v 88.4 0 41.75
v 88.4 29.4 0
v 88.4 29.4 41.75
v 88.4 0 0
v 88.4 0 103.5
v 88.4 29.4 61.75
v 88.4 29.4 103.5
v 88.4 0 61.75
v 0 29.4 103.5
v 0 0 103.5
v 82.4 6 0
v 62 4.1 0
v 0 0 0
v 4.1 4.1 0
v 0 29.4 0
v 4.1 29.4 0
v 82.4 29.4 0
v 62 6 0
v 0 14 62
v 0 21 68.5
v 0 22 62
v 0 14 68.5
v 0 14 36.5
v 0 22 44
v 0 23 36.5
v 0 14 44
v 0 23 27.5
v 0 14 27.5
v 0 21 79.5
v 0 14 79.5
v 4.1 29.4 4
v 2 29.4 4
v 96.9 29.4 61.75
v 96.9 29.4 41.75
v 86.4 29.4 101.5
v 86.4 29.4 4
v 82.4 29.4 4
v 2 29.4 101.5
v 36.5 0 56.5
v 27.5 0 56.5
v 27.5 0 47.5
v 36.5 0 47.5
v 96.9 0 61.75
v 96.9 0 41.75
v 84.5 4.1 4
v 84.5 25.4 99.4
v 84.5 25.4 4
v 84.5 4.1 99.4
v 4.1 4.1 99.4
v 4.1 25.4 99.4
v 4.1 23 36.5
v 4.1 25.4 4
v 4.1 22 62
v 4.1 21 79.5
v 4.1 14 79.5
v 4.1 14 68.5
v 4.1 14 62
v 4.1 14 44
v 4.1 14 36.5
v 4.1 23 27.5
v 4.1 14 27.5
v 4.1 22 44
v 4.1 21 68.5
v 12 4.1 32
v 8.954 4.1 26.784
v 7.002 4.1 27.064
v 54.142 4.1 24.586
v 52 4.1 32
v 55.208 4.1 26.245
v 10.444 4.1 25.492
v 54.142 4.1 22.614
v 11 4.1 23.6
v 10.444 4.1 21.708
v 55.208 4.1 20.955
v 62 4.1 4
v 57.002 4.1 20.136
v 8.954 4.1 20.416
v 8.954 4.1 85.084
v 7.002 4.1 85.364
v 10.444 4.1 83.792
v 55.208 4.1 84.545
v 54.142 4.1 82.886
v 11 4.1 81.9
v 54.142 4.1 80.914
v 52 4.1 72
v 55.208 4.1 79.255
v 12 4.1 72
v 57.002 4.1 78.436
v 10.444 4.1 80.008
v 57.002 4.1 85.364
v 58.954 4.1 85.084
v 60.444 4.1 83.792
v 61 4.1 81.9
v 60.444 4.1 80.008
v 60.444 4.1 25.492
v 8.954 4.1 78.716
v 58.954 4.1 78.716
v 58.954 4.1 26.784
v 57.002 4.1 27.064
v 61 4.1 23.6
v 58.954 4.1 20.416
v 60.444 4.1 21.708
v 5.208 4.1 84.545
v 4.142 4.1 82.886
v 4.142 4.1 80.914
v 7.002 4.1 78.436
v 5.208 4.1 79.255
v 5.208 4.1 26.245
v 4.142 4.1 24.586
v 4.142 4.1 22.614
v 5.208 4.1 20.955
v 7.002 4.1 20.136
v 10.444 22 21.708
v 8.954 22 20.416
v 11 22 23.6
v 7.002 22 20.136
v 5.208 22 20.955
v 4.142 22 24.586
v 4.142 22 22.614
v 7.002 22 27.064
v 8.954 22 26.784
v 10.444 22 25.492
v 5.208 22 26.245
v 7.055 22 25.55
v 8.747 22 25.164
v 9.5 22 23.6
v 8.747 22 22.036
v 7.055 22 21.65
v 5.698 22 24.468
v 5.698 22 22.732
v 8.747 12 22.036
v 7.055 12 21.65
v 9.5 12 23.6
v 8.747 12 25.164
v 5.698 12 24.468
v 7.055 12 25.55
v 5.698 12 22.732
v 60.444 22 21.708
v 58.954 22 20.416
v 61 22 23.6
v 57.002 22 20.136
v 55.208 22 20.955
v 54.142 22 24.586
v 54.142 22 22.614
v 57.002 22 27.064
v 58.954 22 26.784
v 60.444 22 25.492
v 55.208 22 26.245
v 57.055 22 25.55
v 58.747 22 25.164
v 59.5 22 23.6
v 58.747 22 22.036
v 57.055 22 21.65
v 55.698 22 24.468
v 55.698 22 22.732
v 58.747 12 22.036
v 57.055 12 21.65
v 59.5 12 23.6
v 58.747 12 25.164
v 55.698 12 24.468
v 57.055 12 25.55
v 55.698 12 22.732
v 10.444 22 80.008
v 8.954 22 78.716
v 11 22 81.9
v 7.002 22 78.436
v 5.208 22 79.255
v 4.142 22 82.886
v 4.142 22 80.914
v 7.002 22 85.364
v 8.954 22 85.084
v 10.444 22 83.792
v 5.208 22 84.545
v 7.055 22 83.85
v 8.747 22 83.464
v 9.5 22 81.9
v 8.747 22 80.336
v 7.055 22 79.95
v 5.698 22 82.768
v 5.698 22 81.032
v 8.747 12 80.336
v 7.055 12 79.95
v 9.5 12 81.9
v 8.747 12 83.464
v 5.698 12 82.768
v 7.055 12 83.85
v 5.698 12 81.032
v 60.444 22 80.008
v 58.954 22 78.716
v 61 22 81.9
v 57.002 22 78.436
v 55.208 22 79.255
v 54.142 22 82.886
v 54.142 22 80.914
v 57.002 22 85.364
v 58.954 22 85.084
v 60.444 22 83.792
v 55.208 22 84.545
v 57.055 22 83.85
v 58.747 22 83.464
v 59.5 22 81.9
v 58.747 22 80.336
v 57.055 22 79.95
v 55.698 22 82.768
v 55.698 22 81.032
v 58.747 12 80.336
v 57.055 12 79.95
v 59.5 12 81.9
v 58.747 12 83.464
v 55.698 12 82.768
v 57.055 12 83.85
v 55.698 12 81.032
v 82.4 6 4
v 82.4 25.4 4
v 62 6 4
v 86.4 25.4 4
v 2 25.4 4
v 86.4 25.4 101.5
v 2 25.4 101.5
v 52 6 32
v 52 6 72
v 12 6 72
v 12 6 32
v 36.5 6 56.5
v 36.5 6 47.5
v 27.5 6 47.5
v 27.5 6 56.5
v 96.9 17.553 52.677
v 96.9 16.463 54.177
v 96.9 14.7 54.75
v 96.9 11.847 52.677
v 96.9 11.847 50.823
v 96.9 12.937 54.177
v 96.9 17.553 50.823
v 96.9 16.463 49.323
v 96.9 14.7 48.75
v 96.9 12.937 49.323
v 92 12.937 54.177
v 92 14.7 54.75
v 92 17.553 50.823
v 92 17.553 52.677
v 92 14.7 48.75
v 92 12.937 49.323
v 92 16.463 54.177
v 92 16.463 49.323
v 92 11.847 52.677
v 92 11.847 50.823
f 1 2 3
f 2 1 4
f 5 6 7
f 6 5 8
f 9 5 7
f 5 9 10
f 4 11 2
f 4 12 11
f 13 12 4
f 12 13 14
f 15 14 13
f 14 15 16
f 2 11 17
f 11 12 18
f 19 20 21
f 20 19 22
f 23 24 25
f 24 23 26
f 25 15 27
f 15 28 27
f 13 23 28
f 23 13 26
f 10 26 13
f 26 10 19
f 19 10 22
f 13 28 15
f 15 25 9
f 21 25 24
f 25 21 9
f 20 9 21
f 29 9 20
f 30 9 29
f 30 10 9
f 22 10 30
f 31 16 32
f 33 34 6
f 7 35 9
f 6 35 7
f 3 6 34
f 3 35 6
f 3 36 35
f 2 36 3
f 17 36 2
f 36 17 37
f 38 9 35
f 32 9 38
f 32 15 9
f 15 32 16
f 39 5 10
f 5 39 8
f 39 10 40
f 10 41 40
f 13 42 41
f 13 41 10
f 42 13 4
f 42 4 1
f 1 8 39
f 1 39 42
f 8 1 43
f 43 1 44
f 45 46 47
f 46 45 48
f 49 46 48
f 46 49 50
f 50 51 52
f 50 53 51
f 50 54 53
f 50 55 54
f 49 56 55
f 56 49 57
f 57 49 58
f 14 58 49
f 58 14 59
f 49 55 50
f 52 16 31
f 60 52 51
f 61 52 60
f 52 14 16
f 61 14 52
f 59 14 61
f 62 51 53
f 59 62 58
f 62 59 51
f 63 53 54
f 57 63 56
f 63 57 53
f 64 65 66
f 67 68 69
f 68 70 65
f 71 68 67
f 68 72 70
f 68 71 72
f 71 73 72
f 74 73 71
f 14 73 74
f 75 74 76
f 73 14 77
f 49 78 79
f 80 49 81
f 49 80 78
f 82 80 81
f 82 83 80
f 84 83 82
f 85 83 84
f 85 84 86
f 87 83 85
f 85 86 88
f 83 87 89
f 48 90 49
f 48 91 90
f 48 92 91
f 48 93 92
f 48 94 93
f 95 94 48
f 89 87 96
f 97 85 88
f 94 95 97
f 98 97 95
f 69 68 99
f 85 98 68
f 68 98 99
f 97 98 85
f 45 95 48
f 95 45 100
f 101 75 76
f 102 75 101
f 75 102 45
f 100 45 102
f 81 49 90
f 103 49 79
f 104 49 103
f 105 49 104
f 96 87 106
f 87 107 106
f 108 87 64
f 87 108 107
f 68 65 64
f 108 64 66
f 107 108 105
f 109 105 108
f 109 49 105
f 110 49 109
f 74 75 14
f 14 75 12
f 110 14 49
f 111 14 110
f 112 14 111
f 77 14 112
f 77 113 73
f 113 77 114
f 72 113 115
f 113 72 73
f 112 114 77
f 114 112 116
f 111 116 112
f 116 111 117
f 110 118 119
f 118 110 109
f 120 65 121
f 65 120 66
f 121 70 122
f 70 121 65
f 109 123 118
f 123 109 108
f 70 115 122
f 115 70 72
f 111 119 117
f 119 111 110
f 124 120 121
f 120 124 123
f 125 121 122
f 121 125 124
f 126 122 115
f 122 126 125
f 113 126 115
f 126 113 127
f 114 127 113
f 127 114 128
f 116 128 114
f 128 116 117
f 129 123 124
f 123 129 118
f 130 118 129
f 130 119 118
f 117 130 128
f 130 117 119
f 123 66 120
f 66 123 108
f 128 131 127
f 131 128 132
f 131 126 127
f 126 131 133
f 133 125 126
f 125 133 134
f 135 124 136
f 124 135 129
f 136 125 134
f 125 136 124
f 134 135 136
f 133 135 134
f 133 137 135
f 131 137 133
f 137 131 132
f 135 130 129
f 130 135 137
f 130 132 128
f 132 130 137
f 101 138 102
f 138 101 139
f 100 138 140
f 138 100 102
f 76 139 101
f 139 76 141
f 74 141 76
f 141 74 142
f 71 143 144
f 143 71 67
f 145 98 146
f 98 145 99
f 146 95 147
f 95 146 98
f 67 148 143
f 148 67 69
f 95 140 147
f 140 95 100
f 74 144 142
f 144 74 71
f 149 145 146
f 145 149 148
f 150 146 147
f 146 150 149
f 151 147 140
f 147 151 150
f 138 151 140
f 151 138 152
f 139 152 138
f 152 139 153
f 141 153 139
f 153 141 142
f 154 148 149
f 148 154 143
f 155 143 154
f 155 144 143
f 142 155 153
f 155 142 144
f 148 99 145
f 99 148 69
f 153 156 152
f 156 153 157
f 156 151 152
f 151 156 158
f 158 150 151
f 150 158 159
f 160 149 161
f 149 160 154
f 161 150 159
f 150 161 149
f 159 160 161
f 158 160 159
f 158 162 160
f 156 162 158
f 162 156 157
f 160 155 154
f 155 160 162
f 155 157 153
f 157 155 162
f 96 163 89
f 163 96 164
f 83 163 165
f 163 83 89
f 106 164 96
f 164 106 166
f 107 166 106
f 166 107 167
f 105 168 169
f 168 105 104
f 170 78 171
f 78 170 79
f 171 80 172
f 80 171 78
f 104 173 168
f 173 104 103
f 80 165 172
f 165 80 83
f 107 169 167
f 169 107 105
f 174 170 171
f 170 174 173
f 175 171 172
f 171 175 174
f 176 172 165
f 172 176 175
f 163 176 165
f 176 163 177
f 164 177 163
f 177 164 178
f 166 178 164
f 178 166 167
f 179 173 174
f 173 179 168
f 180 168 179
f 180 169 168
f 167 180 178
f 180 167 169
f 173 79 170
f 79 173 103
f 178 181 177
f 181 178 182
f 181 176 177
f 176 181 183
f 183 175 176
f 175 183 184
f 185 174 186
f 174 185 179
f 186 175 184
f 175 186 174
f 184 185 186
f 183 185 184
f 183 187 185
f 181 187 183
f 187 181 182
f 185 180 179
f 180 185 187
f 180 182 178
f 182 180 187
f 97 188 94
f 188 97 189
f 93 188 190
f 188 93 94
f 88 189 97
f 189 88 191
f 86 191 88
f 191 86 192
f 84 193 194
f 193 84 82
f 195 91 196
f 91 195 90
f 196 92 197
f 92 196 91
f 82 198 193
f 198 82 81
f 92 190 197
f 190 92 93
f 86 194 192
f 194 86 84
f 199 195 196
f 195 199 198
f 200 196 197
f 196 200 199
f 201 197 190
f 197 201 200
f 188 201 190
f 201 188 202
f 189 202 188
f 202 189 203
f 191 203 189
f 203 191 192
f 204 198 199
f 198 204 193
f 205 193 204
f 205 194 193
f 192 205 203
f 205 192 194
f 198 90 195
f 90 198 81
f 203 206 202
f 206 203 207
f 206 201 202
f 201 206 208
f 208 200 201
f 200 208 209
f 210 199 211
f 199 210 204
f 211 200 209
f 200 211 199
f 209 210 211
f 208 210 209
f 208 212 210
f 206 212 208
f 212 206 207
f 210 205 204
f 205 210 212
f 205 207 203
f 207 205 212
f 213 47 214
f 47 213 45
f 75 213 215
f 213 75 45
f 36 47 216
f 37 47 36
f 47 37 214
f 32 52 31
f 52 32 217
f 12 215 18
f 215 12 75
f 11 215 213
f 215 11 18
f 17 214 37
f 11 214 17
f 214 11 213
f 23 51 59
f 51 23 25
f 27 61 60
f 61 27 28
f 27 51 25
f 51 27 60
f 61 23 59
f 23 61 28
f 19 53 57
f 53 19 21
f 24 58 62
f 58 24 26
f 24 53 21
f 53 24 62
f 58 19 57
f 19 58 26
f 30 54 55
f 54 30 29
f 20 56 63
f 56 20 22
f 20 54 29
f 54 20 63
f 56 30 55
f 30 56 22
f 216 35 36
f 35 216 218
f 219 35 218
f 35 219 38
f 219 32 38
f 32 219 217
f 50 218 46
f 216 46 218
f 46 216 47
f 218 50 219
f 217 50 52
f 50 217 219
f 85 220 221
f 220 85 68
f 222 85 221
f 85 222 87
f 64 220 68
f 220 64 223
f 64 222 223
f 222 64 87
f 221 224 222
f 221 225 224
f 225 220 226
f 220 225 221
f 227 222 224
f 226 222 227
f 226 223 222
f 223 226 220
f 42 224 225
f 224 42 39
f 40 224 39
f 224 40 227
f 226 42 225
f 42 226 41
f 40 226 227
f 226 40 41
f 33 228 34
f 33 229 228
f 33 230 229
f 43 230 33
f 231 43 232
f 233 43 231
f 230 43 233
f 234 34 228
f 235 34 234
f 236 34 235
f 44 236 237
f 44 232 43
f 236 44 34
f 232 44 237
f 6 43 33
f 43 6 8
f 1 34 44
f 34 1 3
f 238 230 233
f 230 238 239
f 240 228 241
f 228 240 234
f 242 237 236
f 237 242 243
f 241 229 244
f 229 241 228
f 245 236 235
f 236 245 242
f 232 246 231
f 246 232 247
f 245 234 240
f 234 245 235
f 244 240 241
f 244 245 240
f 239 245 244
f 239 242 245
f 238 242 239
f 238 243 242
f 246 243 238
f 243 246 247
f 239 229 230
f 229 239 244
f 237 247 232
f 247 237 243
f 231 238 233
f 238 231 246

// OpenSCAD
batX = 22.4;//Ancho frente
batY = 21.4;//Alto frente
batZ = 90.5;//Profundo


pared = 4;
pared2 = 2*pared;
medPared = pared/2;

raspX = 58;
raspY = 18;
raspZ = 84.5;

h = batY+pared2;

mainAreaX = raspX+batX+pared2; 
mainAreaY = batY+pared2;
mainAreaZ = batZ+pared+5+4;

mainAreaIntX = mainAreaX-pared2;
mainAreaIntY = mainAreaY-pared;
mainAreaIntZ = mainAreaZ-pared;

x1 = pared+3.5;
z1 = 23.6;
x2 = x1+50;
x3 = pared+3.5;
z3 = 81.9;

cejaHorPosX = mainAreaX-batX-pared;
cejaVertPosX = mainAreaX-pared-2;
torH = 18+pared;


//tripod

camNonTripod();

translate([mainAreaX-1,0/*(pared2+batY-20)/2*/,(mainAreaZ/2)-10])
tripodHole();









module tripodHole()
{
difference()
{
cube([4.5+pared+1,pared2+batY,20]);
translate([pared+0.6,(pared2+batY)/2,10])
rotate([0,90,0])
cylinder(r=3,5);
}
}

module camNonTripod()
{
	baseConHome();
	translate([32,0,52])
	camHole();
}

module baseConHome()
{
	difference()
	{
		baseSinHole();

		translate([22,-1,42])
		cube([20,20,20]);
	}
}

module camHole()
{
	difference()
	{
		translate([-20,0,-20])
		cube([40,6,40]);

		translate([-4.5,-0.1,-4.5])
		cube([9,9,9]);
	}
}

module baseSinHole()
{
difference()
{
	baseHoles();

	translate([medPared,batY+pared,pared])
	doTop();	
}
}

module doTop()
{
	cube([
			mainAreaX-pared,
			pared+0.1,
			mainAreaZ-pared2+medPared
	  	]);
}

module baseHoles()
{
	difference()
	{
		baseBatTorn();
		raspHoles();
	}
}


module raspHoles()
{

	posIni = torH-pared-4;

	translate([-3,posIni,32-4.5])
	cube([pared2,9,9]);

	translate([-3,posIni,54-8-2])
	cube([pared2,8,18]);

	translate([-3,posIni,75-4.5-2])
	cube([pared2,7,11]);

}

module baseBatTorn()
{


difference()
{
	cube([
			mainAreaX,
			mainAreaY,
			mainAreaZ
	  	]);

	translate([pared+0.1,pared+0.1,-0.1])
	cube([
			mainAreaIntX,
			mainAreaIntY,
			mainAreaIntZ
	  	]);

}

//Ceja horizontal
translate([cejaHorPosX,0,0])
cube([batX+pared,pared+2,pared]);

//Ceja vertical
translate([cejaVertPosX,0,0])
cube([pared+2,pared2+batY,pared]);

//Tornillos
translate([x1,0,z1])
tornCyl();
translate([x2,0,z1])
tornCyl();
translate([x1,0,z3])
tornCyl();
translate([x2,0,z3])
tornCyl();

}











module tornCyl()
{
	rotate([-90,0,0])
	{
		difference()
		{
			cylinder(r=3.5,torH);
			translate([0,0,(torH/2)+1])
			cylinder(r=2,torH/2);
		}
	}
}





//batPosX = mainAreaX-pared-batX;
//translate([batPosX,pared,pared])
//cube([batX,batY,batZ]);
